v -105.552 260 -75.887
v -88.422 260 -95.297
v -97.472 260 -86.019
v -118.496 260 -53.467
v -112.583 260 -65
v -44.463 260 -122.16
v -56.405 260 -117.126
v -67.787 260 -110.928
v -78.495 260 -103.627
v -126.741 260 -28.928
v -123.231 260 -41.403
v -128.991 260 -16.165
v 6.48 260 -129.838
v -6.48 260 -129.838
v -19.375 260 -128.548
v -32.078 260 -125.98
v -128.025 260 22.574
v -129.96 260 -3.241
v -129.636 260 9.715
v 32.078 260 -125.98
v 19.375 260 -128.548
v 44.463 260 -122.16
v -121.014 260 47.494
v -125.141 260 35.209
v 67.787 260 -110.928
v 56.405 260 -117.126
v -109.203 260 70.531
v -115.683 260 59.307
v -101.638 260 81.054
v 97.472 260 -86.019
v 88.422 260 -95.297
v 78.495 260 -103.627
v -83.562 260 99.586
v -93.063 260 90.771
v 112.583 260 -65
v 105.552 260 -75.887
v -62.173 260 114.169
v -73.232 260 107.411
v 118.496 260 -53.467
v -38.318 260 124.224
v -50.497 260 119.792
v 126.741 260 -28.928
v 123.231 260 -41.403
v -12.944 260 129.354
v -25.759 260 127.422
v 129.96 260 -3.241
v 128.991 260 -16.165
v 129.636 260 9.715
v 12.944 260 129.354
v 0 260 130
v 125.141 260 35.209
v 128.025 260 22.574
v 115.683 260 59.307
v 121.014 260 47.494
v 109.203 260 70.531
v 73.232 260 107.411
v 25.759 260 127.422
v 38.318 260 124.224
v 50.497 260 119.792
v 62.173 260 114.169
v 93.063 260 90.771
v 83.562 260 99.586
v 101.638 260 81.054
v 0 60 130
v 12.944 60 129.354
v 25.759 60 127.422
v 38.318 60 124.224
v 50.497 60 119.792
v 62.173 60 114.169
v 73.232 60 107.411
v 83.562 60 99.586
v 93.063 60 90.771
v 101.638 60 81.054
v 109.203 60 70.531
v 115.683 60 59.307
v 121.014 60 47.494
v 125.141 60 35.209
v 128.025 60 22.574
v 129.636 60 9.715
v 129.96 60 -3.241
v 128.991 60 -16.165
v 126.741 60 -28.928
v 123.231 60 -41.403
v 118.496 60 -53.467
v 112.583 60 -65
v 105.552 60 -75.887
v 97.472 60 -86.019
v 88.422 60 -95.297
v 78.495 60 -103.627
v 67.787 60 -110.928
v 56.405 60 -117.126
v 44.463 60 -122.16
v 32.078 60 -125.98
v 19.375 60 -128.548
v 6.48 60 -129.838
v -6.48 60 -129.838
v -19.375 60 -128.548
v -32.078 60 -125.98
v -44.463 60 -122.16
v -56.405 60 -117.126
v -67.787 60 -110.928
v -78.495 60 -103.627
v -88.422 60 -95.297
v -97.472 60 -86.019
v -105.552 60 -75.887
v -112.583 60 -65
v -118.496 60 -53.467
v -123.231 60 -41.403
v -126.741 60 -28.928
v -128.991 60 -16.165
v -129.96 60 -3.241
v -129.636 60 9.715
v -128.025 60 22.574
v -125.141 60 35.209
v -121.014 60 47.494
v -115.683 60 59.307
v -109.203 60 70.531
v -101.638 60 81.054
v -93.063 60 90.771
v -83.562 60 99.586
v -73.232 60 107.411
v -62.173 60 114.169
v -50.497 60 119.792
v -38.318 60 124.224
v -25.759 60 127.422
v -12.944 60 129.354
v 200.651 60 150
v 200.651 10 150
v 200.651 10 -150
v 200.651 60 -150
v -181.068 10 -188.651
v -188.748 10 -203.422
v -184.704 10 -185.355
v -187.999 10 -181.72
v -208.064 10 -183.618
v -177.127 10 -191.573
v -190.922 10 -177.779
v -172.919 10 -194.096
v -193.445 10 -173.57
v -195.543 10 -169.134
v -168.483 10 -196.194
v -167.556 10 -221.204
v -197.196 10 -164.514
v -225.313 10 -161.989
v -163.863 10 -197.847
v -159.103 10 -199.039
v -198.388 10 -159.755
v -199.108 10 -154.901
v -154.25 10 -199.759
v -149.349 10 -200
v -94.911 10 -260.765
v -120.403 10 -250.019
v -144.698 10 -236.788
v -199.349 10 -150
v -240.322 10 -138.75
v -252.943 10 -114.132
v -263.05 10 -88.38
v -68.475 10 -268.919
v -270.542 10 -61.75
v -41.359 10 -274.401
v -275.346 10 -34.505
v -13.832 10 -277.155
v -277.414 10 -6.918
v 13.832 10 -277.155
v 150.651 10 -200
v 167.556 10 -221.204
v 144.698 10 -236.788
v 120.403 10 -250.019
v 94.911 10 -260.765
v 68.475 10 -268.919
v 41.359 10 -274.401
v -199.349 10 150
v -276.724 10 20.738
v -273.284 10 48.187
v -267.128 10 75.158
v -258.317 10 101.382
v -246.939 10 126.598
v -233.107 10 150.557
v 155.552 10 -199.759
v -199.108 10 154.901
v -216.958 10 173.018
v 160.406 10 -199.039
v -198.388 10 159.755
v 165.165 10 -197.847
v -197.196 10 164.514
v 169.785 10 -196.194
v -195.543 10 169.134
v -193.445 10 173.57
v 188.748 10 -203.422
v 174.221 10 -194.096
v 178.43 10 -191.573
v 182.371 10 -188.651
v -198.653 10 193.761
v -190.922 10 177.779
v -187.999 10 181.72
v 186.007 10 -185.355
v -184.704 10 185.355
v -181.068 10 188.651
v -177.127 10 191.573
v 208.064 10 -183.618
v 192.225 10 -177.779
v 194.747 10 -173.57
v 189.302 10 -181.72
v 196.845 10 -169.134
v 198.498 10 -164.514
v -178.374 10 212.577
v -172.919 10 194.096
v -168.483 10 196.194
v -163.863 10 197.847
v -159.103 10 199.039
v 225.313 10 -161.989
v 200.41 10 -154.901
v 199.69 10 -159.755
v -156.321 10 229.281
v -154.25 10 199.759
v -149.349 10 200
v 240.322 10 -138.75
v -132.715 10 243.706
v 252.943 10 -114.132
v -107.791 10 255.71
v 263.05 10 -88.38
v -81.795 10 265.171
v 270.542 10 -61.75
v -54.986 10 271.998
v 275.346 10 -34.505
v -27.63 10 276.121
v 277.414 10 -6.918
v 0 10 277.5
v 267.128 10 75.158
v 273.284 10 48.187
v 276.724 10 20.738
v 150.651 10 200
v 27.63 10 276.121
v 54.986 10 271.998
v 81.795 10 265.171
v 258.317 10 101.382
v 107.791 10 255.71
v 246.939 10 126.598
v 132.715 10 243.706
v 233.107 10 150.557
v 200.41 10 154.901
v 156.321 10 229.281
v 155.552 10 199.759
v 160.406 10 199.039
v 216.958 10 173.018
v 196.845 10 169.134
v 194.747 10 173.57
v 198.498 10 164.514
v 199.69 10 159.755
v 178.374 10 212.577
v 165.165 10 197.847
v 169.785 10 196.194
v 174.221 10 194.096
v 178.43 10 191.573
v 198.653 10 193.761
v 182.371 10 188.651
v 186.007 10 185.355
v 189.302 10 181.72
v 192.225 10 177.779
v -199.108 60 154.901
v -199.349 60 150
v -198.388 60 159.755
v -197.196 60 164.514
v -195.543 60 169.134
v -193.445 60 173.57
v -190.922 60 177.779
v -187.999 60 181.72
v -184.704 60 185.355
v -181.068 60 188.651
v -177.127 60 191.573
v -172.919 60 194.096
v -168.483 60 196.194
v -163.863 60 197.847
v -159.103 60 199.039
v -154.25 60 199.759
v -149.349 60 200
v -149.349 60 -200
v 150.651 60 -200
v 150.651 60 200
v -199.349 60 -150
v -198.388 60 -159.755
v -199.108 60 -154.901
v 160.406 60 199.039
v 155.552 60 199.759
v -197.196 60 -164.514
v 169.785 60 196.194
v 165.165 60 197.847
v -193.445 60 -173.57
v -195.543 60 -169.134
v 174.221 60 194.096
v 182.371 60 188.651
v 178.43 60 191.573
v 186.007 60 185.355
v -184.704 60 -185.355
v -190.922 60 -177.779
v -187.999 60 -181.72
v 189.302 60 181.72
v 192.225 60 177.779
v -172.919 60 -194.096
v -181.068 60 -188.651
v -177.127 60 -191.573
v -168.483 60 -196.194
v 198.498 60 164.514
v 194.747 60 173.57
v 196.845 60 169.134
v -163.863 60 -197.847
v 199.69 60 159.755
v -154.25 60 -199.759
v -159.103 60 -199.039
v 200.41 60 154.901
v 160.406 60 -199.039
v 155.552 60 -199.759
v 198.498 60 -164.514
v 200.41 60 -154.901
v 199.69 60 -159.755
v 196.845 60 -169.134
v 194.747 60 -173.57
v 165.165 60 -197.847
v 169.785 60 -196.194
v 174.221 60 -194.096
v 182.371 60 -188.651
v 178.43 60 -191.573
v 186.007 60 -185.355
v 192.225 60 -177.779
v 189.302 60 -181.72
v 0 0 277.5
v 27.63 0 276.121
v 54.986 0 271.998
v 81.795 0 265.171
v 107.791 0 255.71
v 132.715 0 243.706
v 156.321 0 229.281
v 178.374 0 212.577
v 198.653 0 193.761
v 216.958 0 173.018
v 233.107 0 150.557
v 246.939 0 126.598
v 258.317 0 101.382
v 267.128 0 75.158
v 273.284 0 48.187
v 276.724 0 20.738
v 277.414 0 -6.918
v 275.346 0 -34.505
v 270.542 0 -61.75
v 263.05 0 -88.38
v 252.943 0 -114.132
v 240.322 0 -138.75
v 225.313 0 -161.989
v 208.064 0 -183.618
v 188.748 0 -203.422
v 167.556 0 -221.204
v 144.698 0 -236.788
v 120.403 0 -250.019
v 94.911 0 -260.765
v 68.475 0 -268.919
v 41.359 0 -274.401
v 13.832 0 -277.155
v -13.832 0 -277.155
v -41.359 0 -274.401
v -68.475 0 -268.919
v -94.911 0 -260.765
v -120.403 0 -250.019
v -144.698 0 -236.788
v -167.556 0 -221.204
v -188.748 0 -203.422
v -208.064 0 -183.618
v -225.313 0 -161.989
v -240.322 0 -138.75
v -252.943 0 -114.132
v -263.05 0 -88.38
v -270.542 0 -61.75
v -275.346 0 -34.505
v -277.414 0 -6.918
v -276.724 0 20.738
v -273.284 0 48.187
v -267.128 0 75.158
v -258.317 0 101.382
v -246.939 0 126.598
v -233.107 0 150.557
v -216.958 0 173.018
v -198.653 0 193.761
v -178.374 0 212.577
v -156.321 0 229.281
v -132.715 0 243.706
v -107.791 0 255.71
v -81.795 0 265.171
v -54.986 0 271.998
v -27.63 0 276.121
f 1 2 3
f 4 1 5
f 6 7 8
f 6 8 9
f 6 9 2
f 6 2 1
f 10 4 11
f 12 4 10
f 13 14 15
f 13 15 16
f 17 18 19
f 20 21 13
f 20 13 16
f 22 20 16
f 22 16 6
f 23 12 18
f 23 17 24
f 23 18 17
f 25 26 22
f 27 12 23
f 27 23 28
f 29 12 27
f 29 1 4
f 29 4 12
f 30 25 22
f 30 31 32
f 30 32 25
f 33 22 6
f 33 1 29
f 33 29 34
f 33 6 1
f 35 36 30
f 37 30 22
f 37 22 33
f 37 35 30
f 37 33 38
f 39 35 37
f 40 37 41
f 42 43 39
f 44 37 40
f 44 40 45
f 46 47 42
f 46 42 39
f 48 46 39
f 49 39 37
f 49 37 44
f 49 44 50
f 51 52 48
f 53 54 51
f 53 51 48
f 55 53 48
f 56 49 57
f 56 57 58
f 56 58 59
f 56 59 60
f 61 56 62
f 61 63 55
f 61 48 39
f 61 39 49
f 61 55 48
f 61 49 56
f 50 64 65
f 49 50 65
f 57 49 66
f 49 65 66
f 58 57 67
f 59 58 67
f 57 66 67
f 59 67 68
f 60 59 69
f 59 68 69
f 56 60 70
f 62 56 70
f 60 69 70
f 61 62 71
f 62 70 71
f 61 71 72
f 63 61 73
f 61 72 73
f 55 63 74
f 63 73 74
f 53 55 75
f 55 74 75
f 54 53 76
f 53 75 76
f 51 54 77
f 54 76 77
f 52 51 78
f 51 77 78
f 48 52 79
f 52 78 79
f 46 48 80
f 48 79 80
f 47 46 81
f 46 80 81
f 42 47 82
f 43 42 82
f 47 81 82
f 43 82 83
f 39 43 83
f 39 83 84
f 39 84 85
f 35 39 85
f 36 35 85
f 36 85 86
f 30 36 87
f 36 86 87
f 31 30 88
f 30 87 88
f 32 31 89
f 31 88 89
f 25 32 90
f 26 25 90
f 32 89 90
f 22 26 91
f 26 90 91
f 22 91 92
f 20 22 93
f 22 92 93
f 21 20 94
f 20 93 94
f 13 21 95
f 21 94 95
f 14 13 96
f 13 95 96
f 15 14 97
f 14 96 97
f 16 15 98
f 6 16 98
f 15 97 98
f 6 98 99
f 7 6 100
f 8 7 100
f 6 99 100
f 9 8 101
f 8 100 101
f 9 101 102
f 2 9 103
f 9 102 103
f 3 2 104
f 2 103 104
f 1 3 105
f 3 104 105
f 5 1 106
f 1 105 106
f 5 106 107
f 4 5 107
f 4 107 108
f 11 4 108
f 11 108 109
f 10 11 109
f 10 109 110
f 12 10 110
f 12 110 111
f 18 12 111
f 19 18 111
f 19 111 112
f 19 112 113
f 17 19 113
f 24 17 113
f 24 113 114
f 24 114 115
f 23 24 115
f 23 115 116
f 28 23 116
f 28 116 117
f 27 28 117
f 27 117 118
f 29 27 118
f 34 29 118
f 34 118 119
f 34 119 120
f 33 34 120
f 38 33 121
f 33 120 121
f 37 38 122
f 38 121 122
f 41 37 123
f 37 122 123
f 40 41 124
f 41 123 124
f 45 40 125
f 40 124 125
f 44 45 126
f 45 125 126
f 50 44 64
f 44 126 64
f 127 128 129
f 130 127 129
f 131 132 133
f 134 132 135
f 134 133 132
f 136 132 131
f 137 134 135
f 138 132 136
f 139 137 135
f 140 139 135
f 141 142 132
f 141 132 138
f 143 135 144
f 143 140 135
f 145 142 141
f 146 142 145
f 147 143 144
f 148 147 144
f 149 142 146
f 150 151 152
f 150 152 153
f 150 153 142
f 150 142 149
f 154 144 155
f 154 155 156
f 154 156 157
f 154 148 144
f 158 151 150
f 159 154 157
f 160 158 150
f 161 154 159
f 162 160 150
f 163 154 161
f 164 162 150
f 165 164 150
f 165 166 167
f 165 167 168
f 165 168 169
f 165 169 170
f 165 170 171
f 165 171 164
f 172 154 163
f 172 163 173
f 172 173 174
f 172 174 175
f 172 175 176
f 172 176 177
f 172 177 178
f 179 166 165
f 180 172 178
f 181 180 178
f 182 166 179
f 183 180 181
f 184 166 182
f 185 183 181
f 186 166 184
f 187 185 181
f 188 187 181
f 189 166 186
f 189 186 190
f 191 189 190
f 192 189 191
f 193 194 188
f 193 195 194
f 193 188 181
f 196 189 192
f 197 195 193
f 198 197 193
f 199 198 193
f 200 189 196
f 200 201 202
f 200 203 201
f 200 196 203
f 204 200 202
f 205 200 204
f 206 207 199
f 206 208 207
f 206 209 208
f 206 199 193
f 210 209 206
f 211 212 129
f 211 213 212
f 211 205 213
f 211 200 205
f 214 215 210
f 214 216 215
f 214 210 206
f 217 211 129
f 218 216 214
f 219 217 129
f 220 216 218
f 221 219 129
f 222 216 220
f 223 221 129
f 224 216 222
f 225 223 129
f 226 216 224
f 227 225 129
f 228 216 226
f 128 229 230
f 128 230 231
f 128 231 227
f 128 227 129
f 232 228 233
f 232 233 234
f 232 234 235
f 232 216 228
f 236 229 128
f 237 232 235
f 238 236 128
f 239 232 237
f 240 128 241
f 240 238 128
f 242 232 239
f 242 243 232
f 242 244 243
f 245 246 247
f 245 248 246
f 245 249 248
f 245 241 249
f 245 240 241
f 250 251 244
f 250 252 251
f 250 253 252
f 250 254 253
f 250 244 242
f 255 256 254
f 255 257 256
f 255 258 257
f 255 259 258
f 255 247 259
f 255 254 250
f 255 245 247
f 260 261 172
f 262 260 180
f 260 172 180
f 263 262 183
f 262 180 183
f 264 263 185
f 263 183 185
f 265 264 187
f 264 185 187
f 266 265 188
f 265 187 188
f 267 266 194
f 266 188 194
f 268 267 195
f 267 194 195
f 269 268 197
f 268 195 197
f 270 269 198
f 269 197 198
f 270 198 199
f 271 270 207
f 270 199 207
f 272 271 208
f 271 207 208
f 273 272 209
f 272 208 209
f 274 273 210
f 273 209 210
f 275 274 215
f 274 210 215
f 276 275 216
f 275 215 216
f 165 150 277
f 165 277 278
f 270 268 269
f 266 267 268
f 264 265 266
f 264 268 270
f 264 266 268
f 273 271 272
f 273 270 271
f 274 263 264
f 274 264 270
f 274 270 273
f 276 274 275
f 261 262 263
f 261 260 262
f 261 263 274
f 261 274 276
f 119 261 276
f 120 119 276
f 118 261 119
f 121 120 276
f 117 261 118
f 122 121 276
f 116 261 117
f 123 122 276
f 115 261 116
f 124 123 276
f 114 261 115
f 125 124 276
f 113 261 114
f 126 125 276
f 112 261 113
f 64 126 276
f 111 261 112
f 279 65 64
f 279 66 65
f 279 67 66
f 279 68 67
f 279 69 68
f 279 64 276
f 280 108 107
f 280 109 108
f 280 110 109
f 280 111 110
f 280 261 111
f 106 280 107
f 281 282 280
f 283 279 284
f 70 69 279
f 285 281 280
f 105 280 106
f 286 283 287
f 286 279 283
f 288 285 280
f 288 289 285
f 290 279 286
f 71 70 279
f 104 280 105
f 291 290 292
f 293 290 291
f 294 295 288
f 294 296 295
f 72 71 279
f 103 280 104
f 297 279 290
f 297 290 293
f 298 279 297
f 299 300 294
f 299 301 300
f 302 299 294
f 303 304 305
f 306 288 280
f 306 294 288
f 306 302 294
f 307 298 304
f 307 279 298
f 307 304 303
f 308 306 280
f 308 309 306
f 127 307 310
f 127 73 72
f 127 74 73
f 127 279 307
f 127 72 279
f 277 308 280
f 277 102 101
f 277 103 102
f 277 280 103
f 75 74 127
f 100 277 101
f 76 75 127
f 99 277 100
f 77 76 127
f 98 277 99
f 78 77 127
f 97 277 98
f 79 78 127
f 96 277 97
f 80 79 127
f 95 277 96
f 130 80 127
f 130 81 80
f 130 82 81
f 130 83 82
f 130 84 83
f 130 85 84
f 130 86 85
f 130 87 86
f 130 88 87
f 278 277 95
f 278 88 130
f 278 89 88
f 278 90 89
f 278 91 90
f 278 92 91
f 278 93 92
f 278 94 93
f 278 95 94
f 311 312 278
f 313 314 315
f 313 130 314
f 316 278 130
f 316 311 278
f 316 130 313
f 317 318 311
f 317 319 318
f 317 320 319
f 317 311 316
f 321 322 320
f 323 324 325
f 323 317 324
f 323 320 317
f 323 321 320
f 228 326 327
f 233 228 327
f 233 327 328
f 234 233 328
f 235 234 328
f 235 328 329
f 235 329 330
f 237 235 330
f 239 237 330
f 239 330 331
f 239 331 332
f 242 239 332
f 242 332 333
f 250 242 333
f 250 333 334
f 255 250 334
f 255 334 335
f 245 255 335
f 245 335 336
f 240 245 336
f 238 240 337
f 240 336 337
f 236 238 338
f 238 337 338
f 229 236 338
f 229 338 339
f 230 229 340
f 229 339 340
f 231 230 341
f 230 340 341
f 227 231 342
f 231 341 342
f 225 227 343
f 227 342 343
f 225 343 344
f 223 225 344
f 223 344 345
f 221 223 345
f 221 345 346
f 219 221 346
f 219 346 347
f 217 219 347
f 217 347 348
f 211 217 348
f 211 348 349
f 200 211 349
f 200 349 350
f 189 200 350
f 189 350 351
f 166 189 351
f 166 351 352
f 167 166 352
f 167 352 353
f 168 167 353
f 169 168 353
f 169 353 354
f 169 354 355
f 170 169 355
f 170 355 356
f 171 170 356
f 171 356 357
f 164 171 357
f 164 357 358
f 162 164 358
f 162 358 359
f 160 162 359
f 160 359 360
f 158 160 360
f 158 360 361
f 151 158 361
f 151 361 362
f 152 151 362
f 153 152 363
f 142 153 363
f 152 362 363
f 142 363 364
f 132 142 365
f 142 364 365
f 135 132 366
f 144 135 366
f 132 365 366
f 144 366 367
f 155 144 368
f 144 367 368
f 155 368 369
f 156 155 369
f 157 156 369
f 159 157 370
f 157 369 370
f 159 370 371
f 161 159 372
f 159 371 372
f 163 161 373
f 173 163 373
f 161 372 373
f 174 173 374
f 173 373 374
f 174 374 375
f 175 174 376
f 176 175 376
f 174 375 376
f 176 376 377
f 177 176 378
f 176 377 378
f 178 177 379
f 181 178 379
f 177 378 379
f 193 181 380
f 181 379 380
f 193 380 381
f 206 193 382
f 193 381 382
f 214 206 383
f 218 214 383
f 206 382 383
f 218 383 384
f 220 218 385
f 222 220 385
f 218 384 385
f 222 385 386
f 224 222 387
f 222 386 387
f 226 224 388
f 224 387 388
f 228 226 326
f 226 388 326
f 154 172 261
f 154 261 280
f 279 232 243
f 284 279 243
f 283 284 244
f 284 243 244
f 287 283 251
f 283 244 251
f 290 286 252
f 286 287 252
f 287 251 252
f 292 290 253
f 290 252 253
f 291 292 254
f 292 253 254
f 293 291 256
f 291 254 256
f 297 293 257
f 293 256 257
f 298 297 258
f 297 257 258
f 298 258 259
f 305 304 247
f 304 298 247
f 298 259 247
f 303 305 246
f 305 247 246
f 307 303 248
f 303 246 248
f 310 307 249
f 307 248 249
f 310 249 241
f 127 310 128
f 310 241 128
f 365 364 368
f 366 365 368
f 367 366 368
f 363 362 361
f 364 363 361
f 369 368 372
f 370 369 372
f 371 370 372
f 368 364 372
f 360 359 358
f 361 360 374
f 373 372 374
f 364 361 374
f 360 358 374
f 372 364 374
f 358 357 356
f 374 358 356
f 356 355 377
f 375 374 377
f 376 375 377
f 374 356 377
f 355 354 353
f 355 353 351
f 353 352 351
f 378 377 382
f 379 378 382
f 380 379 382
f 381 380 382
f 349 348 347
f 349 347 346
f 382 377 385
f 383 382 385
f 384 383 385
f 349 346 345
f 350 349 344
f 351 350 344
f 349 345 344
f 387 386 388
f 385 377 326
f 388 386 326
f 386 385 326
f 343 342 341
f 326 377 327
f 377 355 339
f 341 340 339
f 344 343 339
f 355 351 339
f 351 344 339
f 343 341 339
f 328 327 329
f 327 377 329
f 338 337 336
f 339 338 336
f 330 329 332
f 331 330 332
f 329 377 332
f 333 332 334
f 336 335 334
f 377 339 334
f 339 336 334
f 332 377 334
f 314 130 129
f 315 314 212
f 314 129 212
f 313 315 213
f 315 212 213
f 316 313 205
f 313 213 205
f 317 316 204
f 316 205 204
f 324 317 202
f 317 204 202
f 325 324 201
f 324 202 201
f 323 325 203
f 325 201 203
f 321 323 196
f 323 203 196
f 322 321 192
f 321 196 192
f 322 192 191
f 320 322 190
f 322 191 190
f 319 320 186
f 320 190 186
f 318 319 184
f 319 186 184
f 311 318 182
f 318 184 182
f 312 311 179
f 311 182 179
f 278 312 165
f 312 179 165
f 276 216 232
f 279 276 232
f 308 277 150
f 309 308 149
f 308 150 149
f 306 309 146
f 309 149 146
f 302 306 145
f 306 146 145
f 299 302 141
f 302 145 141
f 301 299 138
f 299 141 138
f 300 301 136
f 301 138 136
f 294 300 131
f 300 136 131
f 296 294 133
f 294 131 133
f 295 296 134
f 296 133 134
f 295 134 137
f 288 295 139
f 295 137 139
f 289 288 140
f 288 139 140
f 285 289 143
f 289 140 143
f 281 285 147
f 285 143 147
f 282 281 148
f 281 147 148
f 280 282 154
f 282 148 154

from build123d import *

# Parameters (mm, degrees)
SKETCH1_R           = 277.5
BOSS_EXTRUDE1_DEPTH = 10
SKETCH2_W           = 400
SKETCH2_H           = 400
BOSS_EXTRUDE2_DEPTH = 50
FILLET1_R           = 50
SKETCH3_R           = 130
BOSS_EXTRUDE3_DEPTH = 200


with BuildPart() as part:
    # Sketch1 → Boss-Extrude1 (new body)
    with BuildSketch(Plane(origin=(0, 0, 0), x_dir=(1, 0, 0), z_dir=(0, 1, 0))):
        with Locations(Location((0, 0, 0), (0, 0, 270))):
            Circle(SKETCH1_R)
    extrude(amount=BOSS_EXTRUDE1_DEPTH)

    # Sketch2 → Boss-Extrude2 (add)
    with BuildSketch(Plane(origin=(0, 10, 0), x_dir=(1, 0, 0), z_dir=(0, 1, 0))):
        with Locations((0.651230283, 0)):
            Rectangle(SKETCH2_W, SKETCH2_H)
    extrude(amount=BOSS_EXTRUDE2_DEPTH)

    # Fillet1
    # the kernel refuses this fillet: 50 mm, written as the material it takes off along each edge
    with BuildSketch(Plane(origin=(200.651230283, 10, 200), x_dir=(-1, 0, 0), z_dir=(0, 1, 0))) as fillet1_piece_1:
        with BuildLine():
            CenterArc((FILLET1_R, -FILLET1_R), FILLET1_R, 90, 90)
            Line((0, -FILLET1_R), (0, 0))
            Line((0, 0), (FILLET1_R, 0))
        make_face()
    extrude(amount=175, mode=Mode.SUBTRACT)
    with BuildSketch(Plane(origin=(200.651230283, 10, -200), x_dir=(-1, 0, 0), z_dir=(0, 1, 0)), Plane(origin=(-199.348769717, 10, -200), x_dir=(0, 0, 1), z_dir=(0, 1, 0)), Plane(origin=(-199.348769717, 10, 200), x_dir=(1, 0, 0), z_dir=(0, 1, 0))) as fillet1_piece_2:
        with BuildLine():
            CenterArc((FILLET1_R, FILLET1_R), FILLET1_R, 180, 90)
            Line((0, FILLET1_R), (0, 0))
            Line((0, 0), (FILLET1_R, 0))
        make_face()
    extrude(amount=175, mode=Mode.SUBTRACT)

    # Sketch3 → Boss-Extrude3 (add)
    with BuildSketch(Plane(origin=(0, 60, 0), x_dir=(1, 0, 0), z_dir=(0, 1, 0))):
        with Locations(Location((0, 0, 0), (0, 0, 270))):
            Circle(SKETCH3_R)
    extrude(amount=BOSS_EXTRUDE3_DEPTH)


solid = part.part
